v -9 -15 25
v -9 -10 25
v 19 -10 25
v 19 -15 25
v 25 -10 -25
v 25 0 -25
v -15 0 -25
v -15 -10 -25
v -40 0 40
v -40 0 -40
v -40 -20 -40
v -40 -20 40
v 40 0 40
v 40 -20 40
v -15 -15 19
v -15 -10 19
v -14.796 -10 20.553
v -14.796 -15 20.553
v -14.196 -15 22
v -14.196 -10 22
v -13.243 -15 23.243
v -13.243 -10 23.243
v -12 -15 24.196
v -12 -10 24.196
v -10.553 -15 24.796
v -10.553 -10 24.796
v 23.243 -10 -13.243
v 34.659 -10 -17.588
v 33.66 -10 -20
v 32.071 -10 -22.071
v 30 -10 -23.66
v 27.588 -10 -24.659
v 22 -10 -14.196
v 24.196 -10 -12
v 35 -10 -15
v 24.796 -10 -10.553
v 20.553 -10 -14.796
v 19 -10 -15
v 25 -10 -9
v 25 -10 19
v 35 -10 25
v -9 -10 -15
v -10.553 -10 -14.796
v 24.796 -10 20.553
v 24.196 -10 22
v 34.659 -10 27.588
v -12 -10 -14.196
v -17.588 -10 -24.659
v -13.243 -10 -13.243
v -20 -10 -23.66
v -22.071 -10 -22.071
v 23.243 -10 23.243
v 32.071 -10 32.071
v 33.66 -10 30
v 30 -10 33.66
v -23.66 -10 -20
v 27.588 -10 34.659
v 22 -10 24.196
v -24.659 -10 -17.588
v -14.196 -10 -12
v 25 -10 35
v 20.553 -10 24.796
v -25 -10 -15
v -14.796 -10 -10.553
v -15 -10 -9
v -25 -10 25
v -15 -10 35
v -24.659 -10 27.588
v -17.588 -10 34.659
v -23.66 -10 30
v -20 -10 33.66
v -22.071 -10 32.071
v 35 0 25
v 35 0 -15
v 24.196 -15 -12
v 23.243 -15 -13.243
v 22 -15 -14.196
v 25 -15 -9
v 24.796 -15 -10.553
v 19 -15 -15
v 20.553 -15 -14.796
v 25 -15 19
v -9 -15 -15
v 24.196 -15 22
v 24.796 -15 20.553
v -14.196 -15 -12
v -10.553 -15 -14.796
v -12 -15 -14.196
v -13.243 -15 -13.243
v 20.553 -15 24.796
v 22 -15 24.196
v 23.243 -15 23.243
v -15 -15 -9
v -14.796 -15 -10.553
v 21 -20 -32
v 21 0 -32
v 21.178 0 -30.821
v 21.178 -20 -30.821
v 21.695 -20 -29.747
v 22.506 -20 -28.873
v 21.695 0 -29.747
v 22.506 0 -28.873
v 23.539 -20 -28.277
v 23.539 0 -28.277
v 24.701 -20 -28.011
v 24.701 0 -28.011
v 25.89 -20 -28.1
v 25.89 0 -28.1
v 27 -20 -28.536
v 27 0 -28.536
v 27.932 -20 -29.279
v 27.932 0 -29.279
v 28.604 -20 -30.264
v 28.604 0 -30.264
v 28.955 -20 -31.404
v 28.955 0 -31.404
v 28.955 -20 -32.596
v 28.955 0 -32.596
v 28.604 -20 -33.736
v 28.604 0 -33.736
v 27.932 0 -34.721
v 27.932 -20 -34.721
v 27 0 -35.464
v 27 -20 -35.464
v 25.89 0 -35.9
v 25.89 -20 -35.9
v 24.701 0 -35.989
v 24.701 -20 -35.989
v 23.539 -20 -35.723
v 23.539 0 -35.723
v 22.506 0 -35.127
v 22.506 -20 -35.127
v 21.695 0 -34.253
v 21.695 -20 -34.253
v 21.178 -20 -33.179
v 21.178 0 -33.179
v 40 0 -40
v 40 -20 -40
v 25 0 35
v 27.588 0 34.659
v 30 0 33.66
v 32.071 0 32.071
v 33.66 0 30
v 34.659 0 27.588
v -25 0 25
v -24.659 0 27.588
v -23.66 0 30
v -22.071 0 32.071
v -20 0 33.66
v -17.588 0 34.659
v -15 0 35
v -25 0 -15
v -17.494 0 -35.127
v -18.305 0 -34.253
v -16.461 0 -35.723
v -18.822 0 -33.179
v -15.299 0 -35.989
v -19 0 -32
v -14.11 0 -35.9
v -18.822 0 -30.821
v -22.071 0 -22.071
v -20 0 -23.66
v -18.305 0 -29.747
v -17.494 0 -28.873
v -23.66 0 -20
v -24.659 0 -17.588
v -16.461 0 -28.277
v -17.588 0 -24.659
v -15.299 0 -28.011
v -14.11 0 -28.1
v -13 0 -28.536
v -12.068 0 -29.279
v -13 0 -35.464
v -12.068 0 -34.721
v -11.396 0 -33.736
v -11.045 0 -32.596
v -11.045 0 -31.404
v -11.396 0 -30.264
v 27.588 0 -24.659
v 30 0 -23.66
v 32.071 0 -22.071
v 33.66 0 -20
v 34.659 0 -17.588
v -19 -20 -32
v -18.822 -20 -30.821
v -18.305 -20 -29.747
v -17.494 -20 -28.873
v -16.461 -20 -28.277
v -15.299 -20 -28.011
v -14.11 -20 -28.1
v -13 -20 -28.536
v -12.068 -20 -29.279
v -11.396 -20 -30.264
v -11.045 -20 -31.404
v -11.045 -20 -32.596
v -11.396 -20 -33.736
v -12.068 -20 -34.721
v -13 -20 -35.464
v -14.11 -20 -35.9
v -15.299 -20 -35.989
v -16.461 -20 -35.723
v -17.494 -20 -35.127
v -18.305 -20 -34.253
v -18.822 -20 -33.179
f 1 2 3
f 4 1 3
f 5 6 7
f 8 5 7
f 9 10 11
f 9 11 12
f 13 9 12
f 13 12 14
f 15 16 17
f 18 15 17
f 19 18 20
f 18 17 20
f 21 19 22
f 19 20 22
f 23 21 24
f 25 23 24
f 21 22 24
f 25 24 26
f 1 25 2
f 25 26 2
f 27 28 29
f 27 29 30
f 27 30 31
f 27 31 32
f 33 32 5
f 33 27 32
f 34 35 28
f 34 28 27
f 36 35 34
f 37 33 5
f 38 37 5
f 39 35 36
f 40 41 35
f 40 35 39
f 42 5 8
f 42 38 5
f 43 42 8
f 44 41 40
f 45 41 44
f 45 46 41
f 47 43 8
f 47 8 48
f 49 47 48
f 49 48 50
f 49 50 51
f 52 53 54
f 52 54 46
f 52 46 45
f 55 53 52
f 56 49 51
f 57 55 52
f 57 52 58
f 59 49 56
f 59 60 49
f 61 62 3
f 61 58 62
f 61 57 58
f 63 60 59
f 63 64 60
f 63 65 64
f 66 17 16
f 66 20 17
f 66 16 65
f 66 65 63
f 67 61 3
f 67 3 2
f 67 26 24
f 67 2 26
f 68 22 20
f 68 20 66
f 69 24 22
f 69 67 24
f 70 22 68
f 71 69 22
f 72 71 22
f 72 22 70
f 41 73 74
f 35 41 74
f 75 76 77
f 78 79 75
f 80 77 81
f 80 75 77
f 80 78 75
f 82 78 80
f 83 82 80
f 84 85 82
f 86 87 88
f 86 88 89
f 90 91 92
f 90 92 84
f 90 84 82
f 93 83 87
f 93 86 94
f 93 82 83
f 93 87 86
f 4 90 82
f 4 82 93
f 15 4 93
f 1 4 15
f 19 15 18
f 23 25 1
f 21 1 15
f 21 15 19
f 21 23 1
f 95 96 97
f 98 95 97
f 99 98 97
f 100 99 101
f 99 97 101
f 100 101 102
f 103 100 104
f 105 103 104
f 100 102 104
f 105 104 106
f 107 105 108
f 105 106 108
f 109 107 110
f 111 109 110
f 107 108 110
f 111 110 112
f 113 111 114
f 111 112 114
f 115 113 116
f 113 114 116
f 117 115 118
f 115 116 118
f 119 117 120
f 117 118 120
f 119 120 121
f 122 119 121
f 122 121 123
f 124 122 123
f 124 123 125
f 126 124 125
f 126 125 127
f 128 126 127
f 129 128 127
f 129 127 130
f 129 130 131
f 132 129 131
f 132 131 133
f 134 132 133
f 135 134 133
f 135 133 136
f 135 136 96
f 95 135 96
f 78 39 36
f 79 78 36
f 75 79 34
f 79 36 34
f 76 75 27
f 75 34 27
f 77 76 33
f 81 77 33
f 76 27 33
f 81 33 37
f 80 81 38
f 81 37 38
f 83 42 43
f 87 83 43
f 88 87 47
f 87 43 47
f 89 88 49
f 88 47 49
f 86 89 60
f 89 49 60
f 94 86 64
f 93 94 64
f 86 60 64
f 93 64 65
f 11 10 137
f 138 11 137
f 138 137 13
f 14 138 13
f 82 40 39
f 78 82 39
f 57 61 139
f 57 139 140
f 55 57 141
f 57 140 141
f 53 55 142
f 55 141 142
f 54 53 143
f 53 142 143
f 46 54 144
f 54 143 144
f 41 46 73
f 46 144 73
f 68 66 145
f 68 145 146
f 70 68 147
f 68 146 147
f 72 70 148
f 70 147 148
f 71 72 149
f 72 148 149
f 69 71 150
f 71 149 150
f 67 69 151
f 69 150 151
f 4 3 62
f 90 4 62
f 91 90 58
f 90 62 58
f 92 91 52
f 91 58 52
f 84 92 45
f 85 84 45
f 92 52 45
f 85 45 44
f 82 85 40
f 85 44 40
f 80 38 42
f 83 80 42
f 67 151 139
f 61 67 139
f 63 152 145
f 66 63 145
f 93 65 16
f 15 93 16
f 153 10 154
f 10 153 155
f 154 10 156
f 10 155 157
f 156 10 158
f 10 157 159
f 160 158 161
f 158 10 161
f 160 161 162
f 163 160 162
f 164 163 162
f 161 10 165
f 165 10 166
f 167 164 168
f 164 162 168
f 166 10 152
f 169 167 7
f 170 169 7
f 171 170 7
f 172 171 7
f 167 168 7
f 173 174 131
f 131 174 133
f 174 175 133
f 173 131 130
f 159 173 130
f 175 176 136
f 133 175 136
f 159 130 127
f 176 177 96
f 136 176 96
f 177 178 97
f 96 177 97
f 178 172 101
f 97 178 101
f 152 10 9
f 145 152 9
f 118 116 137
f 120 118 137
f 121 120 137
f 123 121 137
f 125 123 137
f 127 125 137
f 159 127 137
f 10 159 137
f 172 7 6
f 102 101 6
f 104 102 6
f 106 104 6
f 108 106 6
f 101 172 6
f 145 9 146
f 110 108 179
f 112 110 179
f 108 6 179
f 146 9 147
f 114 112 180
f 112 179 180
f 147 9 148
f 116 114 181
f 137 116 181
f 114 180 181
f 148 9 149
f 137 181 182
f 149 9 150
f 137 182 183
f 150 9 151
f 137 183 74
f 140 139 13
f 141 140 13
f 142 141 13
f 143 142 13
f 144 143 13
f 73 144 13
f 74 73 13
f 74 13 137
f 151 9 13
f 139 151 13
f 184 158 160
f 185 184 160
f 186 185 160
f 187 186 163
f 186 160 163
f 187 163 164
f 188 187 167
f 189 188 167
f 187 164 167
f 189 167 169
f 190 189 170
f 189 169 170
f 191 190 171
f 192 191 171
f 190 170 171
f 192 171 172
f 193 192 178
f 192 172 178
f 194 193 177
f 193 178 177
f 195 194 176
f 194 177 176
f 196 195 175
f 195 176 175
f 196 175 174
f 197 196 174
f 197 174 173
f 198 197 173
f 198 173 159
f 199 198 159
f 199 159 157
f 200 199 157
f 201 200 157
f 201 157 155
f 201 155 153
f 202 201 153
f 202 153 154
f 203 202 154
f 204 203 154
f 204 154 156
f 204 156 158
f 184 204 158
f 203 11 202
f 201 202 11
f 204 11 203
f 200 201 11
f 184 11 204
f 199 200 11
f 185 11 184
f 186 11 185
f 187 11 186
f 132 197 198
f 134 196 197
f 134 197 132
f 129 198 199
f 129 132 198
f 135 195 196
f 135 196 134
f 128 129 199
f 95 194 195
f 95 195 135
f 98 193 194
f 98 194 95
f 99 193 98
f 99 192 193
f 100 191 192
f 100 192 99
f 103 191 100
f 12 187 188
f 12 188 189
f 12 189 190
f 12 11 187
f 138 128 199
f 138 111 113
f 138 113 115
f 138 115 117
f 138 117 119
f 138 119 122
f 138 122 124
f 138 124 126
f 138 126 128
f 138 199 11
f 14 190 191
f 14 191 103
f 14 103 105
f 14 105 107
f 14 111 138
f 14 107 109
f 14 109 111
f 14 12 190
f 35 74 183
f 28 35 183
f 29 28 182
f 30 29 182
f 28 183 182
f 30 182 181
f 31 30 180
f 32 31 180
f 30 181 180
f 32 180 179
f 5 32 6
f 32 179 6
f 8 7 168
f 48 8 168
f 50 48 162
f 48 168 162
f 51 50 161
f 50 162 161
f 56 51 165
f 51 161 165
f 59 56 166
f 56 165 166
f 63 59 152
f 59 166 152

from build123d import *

# Parameters (mm, degrees)
F0_W     = 80
F0_H     = 80
F1_DEPTH = 20
F3_DEPTH = 15
F5_DEPTH = 10
F6_R     = 4
F7_DEPTH = 25


with BuildPart() as f1:
    # F0 (on Front) → F1 (new body)
    with BuildSketch(Plane.XZ):
        Rectangle(F0_W, F0_H)
    extrude(amount=F1_DEPTH)

    # F2 (on face) → F3 (cut)
    with BuildSketch(Plane(origin=(0, 0, 0), x_dir=(-1, 0, 0), z_dir=(0, 1, 0))):
        with BuildLine():
            ThreePointArc((-19, 25), (-23.242641, 23.242641), (-25, 19))
            Line((-25, 19), (-25, -9))
            ThreePointArc((-25, -9), (-23.242641, -13.242641), (-19, -15))
            Line((-19, -15), (9, -15))
            ThreePointArc((9, -15), (13.242641, -13.242641), (15, -9))
            Line((15, -9), (15, 19))
            ThreePointArc((15, 19), (13.242641, 23.242641), (9, 25))
            Line((9, 25), (-19, 25))
        make_face()
    extrude(amount=-F3_DEPTH, mode=Mode.SUBTRACT)

    # F4 (on face) → F5 (cut)
    with BuildSketch(Plane(origin=(0, 0, 0), x_dir=(-1, 0, 0), z_dir=(0, 1, 0))):
        with BuildLine():
            Line((-35, 25), (-35, -15))
            ThreePointArc((-35, -15), (-32.071068, -22.071068), (-25, -25))
            Line((-25, -25), (15, -25))
            ThreePointArc((15, -25), (22.071068, -22.071068), (25, -15))
            Line((25, -15), (25, 25))
            ThreePointArc((25, 25), (22.071068, 32.071068), (15, 35))
            Line((15, 35), (-25, 35))
            ThreePointArc((-25, 35), (-32.071068, 32.071068), (-35, 25))
        make_face()
    extrude(amount=-F5_DEPTH, mode=Mode.SUBTRACT)

    # F6 (on face) → F7 (cut)
    with BuildSketch(Plane(origin=(0, 0, 0), x_dir=(-1, 0, 0), z_dir=(0, 1, 0))):
        with Locations((-25, -32)):
            Circle(F6_R)
        with Locations((15, -32)):
            Circle(F6_R)
    extrude(amount=-F7_DEPTH, mode=Mode.SUBTRACT)


solid = f1.part
